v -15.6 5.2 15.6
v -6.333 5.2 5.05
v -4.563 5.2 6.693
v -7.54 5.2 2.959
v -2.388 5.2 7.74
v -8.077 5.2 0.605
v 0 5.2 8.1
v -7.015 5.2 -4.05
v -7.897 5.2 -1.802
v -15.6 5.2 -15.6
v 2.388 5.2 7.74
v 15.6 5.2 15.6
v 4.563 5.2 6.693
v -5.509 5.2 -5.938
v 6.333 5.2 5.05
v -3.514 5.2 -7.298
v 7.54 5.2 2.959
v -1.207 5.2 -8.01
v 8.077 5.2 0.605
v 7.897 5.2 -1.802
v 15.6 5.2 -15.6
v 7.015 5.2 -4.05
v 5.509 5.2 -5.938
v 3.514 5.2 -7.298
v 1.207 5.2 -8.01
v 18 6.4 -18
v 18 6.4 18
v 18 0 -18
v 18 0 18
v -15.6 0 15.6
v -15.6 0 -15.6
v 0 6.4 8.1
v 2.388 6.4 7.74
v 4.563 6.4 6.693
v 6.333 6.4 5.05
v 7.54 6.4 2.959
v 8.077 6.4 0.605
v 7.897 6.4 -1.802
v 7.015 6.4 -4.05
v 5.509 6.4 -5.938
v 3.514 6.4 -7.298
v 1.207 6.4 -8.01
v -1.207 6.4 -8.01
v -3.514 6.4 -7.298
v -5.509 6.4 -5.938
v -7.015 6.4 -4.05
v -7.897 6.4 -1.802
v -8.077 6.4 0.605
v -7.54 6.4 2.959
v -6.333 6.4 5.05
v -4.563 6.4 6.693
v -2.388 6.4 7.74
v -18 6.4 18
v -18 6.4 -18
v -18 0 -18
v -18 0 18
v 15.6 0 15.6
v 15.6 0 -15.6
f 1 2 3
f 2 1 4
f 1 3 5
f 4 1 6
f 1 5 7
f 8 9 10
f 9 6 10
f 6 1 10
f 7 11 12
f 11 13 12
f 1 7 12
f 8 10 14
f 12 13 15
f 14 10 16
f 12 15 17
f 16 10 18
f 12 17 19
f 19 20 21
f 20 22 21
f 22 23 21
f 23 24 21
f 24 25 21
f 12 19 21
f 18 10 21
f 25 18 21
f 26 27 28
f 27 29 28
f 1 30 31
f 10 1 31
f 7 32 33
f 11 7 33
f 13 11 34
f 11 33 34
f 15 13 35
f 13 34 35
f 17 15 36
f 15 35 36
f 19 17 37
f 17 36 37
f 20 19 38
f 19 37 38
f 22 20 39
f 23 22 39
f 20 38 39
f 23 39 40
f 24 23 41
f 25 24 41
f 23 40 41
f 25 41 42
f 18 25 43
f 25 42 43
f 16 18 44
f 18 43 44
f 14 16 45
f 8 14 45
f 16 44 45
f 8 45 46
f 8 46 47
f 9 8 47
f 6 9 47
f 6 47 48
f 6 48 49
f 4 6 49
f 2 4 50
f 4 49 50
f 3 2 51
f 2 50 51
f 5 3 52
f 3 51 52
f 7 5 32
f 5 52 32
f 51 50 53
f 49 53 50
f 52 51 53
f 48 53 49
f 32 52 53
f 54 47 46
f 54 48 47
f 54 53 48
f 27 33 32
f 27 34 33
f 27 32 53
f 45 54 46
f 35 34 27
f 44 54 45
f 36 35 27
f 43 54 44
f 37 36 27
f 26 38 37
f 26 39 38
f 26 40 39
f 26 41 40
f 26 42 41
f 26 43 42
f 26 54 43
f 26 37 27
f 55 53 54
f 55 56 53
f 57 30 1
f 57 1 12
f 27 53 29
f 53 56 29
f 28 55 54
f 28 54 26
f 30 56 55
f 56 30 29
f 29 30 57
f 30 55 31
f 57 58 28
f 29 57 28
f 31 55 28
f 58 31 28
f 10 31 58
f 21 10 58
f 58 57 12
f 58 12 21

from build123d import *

# Parameters (mm, degrees)
SKETCH1_W           = 36
SKETCH1_H           = 36
SKETCH1_W_2         = 31.2
SKETCH1_H_2         = 31.2
BOSS_EXTRUDE1_DEPTH = 5.2
SKETCH2_W           = 36
SKETCH2_H           = 36
SKETCH2_W_2         = 21.6
SKETCH2_H_2         = 21.6
BOSS_EXTRUDE2_DEPTH = 1.2
SKETCH3_W           = 21.6
SKETCH3_H           = 21.6
SKETCH3_R           = 8.1
BOSS_EXTRUDE3_DEPTH = 1.2


with BuildPart() as part:
    # Sketch1 → Boss-Extrude1 (new body)
    with BuildSketch(Plane(origin=(0, 0, 0), x_dir=(1, 0, 0), z_dir=(0, 1, 0))):
        Rectangle(SKETCH1_W, SKETCH1_H)
        Rectangle(SKETCH1_W_2, SKETCH1_H_2, mode=Mode.SUBTRACT)
    extrude(amount=BOSS_EXTRUDE1_DEPTH)

    # Sketch2 → Boss-Extrude2 (add)
    with BuildSketch(Plane(origin=(0, 5.2, 0), x_dir=(1, 0, 0), z_dir=(0, 1, 0))):
        Rectangle(SKETCH2_W, SKETCH2_H)
        Rectangle(SKETCH2_W_2, SKETCH2_H_2, mode=Mode.SUBTRACT)
    extrude(amount=BOSS_EXTRUDE2_DEPTH)

    # Sketch3 → Boss-Extrude3 (add)
    with BuildSketch(Plane(origin=(0, 6.4, 0), x_dir=(1, 0, 0), z_dir=(0, 1, 0))):
        Rectangle(SKETCH3_W, SKETCH3_H)
        with Locations(Location((0, 0, 0), (0, 0, 270))):
            Circle(SKETCH3_R, mode=Mode.SUBTRACT)
    extrude(amount=-BOSS_EXTRUDE3_DEPTH)


solid = part.part
